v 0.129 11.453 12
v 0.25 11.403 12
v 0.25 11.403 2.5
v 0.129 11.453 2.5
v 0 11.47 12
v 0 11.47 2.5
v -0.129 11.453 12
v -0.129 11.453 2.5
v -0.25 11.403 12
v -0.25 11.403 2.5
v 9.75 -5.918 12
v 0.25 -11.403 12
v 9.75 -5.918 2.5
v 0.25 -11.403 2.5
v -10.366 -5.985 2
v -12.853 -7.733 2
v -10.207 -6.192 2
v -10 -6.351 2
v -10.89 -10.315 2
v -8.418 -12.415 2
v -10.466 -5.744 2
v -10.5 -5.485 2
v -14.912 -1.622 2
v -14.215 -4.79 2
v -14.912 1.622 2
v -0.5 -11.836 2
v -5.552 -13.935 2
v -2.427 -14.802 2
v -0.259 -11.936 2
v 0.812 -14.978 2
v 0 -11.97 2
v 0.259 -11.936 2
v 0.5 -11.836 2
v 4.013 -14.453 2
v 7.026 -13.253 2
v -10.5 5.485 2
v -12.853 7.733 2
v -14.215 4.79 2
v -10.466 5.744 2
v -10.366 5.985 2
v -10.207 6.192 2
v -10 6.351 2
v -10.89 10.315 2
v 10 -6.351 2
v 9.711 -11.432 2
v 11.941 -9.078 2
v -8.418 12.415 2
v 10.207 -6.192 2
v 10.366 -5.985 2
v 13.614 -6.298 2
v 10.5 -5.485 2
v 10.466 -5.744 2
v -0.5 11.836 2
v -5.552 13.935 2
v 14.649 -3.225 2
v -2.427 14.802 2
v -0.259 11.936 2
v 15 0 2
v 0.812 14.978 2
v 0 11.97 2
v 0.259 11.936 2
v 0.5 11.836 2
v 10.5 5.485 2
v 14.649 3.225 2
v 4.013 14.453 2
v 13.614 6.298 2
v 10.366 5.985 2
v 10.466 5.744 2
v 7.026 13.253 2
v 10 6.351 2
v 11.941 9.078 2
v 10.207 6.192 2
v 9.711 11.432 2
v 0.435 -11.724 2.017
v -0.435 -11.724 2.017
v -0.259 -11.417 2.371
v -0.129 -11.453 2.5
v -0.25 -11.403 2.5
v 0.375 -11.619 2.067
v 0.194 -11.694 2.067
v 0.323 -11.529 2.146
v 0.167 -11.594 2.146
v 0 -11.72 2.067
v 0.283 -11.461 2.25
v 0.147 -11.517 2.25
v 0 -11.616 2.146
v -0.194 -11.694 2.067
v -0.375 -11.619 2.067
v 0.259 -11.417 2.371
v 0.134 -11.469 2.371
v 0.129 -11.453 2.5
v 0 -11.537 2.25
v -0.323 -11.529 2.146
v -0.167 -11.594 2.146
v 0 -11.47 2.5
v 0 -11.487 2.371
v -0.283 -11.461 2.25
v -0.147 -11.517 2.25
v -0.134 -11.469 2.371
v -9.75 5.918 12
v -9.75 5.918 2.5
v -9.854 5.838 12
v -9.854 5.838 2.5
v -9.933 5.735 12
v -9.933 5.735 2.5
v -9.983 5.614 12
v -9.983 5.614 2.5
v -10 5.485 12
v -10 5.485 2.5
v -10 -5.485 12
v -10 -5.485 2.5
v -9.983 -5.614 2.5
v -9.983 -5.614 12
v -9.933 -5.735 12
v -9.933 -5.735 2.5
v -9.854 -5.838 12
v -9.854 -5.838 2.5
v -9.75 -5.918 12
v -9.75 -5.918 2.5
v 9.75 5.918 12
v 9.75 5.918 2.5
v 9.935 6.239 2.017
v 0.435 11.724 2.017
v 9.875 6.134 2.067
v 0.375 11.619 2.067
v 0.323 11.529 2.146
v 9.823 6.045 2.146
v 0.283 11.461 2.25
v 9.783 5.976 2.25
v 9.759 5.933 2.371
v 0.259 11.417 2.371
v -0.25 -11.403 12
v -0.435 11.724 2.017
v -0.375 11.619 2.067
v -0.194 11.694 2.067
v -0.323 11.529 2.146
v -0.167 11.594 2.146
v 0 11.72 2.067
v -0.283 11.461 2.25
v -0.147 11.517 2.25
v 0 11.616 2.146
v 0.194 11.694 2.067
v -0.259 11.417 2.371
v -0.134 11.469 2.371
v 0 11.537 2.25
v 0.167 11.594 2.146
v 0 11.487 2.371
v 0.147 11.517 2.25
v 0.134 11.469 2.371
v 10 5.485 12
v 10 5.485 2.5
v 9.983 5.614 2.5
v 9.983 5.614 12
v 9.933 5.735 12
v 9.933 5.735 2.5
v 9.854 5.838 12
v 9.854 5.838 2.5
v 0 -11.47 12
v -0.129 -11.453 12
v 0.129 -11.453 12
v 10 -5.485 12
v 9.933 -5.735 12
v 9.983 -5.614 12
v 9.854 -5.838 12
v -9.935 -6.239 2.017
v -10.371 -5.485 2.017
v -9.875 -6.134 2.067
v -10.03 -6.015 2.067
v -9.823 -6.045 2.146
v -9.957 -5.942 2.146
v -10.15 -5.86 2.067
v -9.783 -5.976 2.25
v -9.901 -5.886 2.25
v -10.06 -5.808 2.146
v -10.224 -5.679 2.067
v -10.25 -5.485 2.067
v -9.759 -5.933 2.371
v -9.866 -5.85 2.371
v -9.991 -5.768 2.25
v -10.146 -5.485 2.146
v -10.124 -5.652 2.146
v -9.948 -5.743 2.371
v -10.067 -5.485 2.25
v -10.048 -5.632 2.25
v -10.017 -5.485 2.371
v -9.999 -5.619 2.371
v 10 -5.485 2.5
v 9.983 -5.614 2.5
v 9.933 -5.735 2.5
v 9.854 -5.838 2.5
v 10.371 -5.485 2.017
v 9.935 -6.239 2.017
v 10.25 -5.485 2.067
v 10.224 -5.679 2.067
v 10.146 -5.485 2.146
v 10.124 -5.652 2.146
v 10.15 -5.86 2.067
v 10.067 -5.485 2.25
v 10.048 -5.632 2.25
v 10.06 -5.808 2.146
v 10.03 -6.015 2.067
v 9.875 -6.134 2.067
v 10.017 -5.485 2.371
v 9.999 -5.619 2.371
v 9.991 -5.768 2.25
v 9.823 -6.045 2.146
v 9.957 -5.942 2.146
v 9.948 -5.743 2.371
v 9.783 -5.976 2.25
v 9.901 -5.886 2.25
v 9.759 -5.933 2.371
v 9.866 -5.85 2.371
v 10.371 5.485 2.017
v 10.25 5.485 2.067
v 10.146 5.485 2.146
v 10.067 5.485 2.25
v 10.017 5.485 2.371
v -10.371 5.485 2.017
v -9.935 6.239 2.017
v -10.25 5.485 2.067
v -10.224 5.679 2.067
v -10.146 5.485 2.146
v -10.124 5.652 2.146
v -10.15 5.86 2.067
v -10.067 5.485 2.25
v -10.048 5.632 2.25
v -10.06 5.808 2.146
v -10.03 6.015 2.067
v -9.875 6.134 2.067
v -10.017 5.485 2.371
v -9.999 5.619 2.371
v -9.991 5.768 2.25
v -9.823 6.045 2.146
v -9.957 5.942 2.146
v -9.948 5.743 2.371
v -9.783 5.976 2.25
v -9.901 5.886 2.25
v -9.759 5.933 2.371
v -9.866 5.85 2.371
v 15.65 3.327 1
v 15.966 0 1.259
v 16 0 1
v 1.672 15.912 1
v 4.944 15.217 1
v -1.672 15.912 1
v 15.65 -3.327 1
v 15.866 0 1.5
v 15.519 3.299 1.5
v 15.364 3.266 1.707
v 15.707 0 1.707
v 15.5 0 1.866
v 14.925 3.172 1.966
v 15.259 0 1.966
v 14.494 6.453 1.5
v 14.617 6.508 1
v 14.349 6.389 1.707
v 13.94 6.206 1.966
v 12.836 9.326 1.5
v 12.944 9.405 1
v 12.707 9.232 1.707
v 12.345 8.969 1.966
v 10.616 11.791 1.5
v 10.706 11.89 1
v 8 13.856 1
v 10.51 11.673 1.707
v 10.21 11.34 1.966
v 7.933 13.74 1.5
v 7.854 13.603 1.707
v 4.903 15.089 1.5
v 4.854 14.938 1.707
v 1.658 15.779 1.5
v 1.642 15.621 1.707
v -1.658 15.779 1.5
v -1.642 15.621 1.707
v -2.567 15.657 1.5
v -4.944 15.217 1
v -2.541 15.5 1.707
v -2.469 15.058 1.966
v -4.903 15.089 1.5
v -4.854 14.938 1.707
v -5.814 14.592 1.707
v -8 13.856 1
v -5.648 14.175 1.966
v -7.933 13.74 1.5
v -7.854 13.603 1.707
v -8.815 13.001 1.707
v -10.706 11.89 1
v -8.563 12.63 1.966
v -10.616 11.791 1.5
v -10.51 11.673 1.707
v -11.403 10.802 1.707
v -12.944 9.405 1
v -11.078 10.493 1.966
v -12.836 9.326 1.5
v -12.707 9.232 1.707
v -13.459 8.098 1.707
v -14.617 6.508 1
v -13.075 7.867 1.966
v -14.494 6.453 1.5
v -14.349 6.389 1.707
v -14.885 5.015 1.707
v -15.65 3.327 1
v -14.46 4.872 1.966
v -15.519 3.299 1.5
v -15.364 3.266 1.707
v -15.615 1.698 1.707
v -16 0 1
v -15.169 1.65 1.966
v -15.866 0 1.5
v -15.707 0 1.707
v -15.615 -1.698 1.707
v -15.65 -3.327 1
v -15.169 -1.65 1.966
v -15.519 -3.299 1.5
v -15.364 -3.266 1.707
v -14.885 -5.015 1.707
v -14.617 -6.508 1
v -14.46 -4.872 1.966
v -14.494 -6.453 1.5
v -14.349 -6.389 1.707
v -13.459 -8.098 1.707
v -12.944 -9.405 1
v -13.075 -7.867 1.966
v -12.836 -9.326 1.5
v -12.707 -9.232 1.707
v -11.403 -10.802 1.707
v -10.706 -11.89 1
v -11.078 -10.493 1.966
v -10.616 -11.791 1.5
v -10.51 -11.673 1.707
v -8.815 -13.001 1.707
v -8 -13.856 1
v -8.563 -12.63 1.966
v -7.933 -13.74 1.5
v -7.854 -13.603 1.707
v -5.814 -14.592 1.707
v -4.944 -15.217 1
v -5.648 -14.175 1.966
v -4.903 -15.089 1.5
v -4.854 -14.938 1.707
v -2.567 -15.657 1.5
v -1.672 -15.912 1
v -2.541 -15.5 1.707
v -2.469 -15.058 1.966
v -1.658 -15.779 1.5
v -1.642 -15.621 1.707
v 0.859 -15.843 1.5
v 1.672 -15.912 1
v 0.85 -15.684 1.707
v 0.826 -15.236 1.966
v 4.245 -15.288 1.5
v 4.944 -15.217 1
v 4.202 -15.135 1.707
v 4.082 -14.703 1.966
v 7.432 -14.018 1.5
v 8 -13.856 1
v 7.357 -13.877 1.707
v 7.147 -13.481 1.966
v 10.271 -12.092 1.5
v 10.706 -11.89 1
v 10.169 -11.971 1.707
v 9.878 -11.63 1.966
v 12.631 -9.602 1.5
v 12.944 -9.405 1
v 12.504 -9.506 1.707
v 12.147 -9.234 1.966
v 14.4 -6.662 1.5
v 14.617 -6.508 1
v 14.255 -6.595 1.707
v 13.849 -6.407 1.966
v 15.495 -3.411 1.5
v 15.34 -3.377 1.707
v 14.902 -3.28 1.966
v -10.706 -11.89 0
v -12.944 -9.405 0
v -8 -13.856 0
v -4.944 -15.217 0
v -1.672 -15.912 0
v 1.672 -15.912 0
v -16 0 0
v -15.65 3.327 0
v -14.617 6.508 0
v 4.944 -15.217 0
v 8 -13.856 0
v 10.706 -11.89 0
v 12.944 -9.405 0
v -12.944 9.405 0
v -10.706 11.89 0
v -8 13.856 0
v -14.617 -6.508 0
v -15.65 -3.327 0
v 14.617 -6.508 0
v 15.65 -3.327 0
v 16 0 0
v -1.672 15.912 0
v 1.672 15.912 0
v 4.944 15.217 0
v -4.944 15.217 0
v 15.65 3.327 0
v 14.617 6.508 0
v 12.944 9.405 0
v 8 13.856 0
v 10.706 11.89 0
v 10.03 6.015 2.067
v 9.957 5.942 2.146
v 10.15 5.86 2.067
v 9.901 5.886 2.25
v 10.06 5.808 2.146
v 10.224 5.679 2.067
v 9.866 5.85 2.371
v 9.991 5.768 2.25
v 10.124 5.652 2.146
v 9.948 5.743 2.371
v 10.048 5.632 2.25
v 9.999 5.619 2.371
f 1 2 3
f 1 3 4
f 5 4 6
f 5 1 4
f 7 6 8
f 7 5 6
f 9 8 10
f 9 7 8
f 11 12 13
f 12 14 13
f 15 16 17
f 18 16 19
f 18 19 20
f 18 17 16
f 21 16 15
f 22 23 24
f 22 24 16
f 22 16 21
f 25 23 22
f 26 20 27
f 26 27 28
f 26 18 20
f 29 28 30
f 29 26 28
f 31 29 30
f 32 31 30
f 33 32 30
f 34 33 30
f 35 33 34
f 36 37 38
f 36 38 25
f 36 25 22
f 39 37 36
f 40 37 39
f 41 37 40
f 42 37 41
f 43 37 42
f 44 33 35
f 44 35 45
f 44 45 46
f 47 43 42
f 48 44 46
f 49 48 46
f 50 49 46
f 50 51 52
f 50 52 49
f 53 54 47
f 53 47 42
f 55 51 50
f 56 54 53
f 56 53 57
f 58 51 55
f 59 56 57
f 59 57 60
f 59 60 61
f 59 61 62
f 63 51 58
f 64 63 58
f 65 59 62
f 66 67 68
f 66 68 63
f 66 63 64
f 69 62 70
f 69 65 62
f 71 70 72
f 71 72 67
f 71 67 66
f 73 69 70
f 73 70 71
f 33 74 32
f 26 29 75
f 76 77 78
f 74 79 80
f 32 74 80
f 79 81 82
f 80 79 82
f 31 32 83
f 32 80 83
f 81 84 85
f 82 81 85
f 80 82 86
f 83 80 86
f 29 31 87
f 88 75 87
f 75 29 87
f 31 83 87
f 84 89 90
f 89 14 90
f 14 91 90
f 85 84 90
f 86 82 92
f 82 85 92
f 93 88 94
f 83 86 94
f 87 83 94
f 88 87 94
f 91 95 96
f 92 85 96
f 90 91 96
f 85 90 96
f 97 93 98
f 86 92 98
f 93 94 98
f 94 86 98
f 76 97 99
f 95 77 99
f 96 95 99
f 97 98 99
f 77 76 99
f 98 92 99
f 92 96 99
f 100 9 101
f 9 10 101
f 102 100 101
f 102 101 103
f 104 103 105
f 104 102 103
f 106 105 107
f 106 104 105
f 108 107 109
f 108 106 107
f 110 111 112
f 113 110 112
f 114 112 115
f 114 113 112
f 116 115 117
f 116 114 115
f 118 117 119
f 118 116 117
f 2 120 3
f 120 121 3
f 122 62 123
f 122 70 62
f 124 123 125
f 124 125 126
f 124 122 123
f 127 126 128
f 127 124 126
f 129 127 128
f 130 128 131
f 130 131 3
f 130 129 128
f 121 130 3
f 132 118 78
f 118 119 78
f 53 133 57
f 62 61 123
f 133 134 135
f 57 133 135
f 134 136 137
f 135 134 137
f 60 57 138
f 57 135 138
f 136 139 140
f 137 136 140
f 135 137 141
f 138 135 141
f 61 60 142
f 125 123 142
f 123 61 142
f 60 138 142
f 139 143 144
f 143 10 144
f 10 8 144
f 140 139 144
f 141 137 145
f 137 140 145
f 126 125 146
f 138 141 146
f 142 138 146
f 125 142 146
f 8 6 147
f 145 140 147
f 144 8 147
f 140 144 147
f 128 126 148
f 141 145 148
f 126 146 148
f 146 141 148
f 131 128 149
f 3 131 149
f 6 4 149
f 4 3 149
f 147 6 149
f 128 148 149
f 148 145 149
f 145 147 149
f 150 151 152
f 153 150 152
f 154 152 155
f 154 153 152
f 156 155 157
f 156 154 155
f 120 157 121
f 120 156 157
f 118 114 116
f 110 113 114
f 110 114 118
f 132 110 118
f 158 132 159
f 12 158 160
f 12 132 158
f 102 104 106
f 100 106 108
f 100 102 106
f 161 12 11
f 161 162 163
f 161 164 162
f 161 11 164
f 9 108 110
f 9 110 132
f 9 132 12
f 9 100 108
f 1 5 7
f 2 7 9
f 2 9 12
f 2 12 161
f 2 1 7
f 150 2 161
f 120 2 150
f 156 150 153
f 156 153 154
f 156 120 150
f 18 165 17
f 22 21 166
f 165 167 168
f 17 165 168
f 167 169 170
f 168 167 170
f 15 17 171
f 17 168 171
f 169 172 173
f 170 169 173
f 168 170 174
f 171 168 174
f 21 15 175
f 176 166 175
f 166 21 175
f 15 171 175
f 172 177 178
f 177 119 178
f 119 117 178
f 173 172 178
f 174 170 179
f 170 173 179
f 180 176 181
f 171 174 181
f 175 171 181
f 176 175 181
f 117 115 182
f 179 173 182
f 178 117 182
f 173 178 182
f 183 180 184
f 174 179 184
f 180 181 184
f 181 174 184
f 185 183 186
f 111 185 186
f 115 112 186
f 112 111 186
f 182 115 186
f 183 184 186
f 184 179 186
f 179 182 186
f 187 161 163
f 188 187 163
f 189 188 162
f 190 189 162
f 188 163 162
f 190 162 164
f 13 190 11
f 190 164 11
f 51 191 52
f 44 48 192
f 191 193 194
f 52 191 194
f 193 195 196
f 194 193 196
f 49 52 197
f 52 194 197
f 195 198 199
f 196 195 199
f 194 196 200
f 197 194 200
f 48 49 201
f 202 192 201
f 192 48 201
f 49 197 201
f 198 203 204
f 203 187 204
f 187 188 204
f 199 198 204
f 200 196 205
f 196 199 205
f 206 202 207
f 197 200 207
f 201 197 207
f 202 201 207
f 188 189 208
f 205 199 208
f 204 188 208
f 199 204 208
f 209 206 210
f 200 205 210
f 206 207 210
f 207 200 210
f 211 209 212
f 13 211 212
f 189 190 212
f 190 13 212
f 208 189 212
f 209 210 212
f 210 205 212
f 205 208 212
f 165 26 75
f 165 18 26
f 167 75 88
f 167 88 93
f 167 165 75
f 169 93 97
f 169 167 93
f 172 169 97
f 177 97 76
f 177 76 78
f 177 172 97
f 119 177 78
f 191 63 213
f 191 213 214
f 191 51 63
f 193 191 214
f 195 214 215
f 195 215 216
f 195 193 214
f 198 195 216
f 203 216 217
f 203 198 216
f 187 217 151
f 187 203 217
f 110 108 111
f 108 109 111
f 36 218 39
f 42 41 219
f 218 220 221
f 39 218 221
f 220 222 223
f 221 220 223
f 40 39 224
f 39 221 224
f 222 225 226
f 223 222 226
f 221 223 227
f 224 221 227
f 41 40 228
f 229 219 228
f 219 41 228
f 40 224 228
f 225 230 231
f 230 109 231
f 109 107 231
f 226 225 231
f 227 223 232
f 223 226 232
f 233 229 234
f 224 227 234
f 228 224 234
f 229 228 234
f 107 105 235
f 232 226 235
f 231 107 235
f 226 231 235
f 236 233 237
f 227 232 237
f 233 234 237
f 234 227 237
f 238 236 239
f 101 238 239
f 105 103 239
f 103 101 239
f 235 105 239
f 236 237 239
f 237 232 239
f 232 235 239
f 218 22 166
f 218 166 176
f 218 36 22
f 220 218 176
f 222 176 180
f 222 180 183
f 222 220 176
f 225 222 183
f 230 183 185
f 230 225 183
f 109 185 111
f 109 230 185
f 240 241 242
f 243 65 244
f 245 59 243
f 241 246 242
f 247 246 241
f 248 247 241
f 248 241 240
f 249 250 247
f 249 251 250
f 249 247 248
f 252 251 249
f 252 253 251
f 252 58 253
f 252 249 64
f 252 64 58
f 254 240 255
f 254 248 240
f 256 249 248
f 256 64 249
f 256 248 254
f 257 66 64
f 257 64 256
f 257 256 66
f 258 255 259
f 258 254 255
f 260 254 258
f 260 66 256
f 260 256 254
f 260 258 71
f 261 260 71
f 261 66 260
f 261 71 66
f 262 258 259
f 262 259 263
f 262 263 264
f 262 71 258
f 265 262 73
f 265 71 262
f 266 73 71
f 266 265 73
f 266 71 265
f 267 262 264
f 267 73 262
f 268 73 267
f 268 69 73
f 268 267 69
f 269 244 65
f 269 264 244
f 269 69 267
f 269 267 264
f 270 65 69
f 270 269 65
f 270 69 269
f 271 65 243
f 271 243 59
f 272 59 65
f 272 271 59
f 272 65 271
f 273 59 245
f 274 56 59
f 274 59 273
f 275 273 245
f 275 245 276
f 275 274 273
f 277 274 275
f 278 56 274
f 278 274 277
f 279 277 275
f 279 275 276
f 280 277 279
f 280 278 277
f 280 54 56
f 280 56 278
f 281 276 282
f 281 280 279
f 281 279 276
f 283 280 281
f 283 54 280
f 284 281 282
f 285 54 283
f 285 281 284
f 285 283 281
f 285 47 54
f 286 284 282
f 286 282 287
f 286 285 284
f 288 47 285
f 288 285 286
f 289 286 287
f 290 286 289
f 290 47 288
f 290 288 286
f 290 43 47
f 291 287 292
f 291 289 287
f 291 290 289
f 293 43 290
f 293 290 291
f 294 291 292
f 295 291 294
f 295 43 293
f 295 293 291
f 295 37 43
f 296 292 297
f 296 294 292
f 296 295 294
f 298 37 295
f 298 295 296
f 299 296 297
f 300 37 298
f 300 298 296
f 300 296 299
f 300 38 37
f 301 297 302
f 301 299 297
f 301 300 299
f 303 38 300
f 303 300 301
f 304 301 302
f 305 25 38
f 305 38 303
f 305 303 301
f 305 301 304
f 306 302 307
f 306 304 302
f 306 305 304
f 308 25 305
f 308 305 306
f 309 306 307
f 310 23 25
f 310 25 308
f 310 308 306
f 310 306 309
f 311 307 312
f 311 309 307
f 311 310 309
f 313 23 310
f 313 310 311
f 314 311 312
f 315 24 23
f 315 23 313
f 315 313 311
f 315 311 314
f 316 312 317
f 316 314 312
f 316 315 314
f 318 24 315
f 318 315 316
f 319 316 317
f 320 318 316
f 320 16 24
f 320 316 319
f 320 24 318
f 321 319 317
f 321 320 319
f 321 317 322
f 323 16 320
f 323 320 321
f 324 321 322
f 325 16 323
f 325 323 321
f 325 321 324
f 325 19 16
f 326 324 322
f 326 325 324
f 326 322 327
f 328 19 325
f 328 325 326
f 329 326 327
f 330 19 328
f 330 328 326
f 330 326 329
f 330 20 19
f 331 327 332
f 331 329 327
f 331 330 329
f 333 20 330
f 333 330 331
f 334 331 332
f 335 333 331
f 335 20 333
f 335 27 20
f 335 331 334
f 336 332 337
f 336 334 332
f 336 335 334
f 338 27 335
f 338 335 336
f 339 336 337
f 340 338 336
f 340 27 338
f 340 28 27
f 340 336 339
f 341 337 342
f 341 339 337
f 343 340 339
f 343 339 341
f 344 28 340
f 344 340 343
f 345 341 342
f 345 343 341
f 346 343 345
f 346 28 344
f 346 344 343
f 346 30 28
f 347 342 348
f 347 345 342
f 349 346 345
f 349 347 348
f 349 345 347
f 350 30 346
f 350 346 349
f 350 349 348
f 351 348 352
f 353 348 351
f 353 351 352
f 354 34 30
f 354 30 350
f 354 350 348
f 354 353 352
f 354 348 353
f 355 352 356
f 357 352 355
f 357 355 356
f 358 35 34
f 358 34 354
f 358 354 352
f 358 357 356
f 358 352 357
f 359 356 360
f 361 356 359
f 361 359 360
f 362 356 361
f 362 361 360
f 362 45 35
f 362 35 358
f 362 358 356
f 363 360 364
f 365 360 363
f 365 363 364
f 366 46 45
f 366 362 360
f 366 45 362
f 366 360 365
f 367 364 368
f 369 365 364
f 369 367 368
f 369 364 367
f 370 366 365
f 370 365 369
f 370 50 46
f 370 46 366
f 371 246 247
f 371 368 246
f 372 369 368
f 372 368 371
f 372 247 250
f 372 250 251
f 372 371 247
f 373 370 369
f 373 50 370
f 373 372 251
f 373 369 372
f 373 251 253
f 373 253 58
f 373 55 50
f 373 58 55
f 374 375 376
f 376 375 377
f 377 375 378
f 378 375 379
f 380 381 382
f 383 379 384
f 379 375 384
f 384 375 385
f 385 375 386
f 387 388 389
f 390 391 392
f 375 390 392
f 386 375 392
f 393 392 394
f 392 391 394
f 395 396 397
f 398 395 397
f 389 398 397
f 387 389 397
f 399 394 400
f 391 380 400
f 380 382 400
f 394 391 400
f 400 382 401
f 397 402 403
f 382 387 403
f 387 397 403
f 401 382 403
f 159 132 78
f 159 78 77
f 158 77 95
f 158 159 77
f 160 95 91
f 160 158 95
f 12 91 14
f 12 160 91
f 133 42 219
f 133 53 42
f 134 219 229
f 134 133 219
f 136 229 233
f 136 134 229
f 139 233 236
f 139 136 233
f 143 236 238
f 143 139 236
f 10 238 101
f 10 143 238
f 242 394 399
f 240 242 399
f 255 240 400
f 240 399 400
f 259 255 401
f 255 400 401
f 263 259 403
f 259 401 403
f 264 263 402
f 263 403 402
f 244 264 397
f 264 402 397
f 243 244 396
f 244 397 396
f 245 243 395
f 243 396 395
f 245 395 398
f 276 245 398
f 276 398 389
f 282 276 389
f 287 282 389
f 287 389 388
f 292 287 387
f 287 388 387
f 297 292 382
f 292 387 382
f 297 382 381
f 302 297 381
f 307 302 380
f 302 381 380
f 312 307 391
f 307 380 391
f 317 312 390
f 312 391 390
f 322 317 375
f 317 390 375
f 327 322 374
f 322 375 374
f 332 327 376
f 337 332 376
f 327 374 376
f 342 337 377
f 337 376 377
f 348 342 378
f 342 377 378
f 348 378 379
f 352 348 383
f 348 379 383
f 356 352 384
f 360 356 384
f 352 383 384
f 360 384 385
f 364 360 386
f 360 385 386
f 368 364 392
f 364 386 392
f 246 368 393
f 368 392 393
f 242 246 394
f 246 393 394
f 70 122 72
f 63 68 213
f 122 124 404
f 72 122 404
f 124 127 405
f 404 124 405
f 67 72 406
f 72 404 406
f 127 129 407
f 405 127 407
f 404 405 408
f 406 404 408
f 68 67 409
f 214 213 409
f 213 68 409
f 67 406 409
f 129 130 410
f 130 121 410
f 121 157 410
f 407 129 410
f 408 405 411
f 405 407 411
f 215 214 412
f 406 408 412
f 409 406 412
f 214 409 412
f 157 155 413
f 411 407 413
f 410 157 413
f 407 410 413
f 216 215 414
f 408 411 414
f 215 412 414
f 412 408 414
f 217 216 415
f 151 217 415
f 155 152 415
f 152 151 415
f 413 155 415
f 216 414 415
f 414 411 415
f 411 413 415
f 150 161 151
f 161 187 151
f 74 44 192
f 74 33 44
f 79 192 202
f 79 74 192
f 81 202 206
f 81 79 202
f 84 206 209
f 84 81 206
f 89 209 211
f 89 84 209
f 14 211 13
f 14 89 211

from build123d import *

# Parameters (mm, degrees)
F0_R     = 16
F1_DEPTH = 2
F2_R     = 1
F3_DEPTH = 12
F4_R     = 0.5


with BuildPart() as f1:
    # F0 (on Top) → F1 (new body)
    with BuildSketch(Plane.XY):
        Circle(F0_R)
        Polygon((10, 5.773503), (10, -5.773503), (0, -11.547005), (-10, -5.773503), (-10, 5.773503), (0, 11.547005), align=None, mode=Mode.SUBTRACT)
        Polygon((0, -11.547005), (10, -5.773503), (10, 5.773503), (0, 11.547005), (-10, 5.773503), (-10, -5.773503), align=None)
    extrude(amount=F1_DEPTH)

    # F2
    f2_edges = [f1.edges().sort_by_distance(p)[0] for p in [
        (-16, 0, 2),
    ]]
    fillet(f2_edges, radius=F2_R)

    # F0 (on Top) → F3 (join)
    with BuildSketch(Plane.XY):
        Polygon((0, -11.547005), (10, -5.773503), (10, 5.773503), (0, 11.547005), (-10, 5.773503), (-10, -5.773503), align=None)
    extrude(amount=F3_DEPTH)

    # F4
    f4_edges = [f1.edges().sort_by_distance(p)[0] for p in [
        (10, 0, 2),
        (5, -8.660254, 2),
        (10, -5.773503, 7),
        (10, 5.773503, 7),
        (5, 8.660254, 2),
        (0, 11.547005, 7),
        (-5, 8.660254, 2),
        (-10, 5.773503, 7),
        (-10, 0, 2),
        (-10, -5.773503, 7),
        (-5, -8.660254, 2),
        (0, -11.547005, 7),
    ]]
    fillet(f4_edges, radius=F4_R)


solid = f1.part
